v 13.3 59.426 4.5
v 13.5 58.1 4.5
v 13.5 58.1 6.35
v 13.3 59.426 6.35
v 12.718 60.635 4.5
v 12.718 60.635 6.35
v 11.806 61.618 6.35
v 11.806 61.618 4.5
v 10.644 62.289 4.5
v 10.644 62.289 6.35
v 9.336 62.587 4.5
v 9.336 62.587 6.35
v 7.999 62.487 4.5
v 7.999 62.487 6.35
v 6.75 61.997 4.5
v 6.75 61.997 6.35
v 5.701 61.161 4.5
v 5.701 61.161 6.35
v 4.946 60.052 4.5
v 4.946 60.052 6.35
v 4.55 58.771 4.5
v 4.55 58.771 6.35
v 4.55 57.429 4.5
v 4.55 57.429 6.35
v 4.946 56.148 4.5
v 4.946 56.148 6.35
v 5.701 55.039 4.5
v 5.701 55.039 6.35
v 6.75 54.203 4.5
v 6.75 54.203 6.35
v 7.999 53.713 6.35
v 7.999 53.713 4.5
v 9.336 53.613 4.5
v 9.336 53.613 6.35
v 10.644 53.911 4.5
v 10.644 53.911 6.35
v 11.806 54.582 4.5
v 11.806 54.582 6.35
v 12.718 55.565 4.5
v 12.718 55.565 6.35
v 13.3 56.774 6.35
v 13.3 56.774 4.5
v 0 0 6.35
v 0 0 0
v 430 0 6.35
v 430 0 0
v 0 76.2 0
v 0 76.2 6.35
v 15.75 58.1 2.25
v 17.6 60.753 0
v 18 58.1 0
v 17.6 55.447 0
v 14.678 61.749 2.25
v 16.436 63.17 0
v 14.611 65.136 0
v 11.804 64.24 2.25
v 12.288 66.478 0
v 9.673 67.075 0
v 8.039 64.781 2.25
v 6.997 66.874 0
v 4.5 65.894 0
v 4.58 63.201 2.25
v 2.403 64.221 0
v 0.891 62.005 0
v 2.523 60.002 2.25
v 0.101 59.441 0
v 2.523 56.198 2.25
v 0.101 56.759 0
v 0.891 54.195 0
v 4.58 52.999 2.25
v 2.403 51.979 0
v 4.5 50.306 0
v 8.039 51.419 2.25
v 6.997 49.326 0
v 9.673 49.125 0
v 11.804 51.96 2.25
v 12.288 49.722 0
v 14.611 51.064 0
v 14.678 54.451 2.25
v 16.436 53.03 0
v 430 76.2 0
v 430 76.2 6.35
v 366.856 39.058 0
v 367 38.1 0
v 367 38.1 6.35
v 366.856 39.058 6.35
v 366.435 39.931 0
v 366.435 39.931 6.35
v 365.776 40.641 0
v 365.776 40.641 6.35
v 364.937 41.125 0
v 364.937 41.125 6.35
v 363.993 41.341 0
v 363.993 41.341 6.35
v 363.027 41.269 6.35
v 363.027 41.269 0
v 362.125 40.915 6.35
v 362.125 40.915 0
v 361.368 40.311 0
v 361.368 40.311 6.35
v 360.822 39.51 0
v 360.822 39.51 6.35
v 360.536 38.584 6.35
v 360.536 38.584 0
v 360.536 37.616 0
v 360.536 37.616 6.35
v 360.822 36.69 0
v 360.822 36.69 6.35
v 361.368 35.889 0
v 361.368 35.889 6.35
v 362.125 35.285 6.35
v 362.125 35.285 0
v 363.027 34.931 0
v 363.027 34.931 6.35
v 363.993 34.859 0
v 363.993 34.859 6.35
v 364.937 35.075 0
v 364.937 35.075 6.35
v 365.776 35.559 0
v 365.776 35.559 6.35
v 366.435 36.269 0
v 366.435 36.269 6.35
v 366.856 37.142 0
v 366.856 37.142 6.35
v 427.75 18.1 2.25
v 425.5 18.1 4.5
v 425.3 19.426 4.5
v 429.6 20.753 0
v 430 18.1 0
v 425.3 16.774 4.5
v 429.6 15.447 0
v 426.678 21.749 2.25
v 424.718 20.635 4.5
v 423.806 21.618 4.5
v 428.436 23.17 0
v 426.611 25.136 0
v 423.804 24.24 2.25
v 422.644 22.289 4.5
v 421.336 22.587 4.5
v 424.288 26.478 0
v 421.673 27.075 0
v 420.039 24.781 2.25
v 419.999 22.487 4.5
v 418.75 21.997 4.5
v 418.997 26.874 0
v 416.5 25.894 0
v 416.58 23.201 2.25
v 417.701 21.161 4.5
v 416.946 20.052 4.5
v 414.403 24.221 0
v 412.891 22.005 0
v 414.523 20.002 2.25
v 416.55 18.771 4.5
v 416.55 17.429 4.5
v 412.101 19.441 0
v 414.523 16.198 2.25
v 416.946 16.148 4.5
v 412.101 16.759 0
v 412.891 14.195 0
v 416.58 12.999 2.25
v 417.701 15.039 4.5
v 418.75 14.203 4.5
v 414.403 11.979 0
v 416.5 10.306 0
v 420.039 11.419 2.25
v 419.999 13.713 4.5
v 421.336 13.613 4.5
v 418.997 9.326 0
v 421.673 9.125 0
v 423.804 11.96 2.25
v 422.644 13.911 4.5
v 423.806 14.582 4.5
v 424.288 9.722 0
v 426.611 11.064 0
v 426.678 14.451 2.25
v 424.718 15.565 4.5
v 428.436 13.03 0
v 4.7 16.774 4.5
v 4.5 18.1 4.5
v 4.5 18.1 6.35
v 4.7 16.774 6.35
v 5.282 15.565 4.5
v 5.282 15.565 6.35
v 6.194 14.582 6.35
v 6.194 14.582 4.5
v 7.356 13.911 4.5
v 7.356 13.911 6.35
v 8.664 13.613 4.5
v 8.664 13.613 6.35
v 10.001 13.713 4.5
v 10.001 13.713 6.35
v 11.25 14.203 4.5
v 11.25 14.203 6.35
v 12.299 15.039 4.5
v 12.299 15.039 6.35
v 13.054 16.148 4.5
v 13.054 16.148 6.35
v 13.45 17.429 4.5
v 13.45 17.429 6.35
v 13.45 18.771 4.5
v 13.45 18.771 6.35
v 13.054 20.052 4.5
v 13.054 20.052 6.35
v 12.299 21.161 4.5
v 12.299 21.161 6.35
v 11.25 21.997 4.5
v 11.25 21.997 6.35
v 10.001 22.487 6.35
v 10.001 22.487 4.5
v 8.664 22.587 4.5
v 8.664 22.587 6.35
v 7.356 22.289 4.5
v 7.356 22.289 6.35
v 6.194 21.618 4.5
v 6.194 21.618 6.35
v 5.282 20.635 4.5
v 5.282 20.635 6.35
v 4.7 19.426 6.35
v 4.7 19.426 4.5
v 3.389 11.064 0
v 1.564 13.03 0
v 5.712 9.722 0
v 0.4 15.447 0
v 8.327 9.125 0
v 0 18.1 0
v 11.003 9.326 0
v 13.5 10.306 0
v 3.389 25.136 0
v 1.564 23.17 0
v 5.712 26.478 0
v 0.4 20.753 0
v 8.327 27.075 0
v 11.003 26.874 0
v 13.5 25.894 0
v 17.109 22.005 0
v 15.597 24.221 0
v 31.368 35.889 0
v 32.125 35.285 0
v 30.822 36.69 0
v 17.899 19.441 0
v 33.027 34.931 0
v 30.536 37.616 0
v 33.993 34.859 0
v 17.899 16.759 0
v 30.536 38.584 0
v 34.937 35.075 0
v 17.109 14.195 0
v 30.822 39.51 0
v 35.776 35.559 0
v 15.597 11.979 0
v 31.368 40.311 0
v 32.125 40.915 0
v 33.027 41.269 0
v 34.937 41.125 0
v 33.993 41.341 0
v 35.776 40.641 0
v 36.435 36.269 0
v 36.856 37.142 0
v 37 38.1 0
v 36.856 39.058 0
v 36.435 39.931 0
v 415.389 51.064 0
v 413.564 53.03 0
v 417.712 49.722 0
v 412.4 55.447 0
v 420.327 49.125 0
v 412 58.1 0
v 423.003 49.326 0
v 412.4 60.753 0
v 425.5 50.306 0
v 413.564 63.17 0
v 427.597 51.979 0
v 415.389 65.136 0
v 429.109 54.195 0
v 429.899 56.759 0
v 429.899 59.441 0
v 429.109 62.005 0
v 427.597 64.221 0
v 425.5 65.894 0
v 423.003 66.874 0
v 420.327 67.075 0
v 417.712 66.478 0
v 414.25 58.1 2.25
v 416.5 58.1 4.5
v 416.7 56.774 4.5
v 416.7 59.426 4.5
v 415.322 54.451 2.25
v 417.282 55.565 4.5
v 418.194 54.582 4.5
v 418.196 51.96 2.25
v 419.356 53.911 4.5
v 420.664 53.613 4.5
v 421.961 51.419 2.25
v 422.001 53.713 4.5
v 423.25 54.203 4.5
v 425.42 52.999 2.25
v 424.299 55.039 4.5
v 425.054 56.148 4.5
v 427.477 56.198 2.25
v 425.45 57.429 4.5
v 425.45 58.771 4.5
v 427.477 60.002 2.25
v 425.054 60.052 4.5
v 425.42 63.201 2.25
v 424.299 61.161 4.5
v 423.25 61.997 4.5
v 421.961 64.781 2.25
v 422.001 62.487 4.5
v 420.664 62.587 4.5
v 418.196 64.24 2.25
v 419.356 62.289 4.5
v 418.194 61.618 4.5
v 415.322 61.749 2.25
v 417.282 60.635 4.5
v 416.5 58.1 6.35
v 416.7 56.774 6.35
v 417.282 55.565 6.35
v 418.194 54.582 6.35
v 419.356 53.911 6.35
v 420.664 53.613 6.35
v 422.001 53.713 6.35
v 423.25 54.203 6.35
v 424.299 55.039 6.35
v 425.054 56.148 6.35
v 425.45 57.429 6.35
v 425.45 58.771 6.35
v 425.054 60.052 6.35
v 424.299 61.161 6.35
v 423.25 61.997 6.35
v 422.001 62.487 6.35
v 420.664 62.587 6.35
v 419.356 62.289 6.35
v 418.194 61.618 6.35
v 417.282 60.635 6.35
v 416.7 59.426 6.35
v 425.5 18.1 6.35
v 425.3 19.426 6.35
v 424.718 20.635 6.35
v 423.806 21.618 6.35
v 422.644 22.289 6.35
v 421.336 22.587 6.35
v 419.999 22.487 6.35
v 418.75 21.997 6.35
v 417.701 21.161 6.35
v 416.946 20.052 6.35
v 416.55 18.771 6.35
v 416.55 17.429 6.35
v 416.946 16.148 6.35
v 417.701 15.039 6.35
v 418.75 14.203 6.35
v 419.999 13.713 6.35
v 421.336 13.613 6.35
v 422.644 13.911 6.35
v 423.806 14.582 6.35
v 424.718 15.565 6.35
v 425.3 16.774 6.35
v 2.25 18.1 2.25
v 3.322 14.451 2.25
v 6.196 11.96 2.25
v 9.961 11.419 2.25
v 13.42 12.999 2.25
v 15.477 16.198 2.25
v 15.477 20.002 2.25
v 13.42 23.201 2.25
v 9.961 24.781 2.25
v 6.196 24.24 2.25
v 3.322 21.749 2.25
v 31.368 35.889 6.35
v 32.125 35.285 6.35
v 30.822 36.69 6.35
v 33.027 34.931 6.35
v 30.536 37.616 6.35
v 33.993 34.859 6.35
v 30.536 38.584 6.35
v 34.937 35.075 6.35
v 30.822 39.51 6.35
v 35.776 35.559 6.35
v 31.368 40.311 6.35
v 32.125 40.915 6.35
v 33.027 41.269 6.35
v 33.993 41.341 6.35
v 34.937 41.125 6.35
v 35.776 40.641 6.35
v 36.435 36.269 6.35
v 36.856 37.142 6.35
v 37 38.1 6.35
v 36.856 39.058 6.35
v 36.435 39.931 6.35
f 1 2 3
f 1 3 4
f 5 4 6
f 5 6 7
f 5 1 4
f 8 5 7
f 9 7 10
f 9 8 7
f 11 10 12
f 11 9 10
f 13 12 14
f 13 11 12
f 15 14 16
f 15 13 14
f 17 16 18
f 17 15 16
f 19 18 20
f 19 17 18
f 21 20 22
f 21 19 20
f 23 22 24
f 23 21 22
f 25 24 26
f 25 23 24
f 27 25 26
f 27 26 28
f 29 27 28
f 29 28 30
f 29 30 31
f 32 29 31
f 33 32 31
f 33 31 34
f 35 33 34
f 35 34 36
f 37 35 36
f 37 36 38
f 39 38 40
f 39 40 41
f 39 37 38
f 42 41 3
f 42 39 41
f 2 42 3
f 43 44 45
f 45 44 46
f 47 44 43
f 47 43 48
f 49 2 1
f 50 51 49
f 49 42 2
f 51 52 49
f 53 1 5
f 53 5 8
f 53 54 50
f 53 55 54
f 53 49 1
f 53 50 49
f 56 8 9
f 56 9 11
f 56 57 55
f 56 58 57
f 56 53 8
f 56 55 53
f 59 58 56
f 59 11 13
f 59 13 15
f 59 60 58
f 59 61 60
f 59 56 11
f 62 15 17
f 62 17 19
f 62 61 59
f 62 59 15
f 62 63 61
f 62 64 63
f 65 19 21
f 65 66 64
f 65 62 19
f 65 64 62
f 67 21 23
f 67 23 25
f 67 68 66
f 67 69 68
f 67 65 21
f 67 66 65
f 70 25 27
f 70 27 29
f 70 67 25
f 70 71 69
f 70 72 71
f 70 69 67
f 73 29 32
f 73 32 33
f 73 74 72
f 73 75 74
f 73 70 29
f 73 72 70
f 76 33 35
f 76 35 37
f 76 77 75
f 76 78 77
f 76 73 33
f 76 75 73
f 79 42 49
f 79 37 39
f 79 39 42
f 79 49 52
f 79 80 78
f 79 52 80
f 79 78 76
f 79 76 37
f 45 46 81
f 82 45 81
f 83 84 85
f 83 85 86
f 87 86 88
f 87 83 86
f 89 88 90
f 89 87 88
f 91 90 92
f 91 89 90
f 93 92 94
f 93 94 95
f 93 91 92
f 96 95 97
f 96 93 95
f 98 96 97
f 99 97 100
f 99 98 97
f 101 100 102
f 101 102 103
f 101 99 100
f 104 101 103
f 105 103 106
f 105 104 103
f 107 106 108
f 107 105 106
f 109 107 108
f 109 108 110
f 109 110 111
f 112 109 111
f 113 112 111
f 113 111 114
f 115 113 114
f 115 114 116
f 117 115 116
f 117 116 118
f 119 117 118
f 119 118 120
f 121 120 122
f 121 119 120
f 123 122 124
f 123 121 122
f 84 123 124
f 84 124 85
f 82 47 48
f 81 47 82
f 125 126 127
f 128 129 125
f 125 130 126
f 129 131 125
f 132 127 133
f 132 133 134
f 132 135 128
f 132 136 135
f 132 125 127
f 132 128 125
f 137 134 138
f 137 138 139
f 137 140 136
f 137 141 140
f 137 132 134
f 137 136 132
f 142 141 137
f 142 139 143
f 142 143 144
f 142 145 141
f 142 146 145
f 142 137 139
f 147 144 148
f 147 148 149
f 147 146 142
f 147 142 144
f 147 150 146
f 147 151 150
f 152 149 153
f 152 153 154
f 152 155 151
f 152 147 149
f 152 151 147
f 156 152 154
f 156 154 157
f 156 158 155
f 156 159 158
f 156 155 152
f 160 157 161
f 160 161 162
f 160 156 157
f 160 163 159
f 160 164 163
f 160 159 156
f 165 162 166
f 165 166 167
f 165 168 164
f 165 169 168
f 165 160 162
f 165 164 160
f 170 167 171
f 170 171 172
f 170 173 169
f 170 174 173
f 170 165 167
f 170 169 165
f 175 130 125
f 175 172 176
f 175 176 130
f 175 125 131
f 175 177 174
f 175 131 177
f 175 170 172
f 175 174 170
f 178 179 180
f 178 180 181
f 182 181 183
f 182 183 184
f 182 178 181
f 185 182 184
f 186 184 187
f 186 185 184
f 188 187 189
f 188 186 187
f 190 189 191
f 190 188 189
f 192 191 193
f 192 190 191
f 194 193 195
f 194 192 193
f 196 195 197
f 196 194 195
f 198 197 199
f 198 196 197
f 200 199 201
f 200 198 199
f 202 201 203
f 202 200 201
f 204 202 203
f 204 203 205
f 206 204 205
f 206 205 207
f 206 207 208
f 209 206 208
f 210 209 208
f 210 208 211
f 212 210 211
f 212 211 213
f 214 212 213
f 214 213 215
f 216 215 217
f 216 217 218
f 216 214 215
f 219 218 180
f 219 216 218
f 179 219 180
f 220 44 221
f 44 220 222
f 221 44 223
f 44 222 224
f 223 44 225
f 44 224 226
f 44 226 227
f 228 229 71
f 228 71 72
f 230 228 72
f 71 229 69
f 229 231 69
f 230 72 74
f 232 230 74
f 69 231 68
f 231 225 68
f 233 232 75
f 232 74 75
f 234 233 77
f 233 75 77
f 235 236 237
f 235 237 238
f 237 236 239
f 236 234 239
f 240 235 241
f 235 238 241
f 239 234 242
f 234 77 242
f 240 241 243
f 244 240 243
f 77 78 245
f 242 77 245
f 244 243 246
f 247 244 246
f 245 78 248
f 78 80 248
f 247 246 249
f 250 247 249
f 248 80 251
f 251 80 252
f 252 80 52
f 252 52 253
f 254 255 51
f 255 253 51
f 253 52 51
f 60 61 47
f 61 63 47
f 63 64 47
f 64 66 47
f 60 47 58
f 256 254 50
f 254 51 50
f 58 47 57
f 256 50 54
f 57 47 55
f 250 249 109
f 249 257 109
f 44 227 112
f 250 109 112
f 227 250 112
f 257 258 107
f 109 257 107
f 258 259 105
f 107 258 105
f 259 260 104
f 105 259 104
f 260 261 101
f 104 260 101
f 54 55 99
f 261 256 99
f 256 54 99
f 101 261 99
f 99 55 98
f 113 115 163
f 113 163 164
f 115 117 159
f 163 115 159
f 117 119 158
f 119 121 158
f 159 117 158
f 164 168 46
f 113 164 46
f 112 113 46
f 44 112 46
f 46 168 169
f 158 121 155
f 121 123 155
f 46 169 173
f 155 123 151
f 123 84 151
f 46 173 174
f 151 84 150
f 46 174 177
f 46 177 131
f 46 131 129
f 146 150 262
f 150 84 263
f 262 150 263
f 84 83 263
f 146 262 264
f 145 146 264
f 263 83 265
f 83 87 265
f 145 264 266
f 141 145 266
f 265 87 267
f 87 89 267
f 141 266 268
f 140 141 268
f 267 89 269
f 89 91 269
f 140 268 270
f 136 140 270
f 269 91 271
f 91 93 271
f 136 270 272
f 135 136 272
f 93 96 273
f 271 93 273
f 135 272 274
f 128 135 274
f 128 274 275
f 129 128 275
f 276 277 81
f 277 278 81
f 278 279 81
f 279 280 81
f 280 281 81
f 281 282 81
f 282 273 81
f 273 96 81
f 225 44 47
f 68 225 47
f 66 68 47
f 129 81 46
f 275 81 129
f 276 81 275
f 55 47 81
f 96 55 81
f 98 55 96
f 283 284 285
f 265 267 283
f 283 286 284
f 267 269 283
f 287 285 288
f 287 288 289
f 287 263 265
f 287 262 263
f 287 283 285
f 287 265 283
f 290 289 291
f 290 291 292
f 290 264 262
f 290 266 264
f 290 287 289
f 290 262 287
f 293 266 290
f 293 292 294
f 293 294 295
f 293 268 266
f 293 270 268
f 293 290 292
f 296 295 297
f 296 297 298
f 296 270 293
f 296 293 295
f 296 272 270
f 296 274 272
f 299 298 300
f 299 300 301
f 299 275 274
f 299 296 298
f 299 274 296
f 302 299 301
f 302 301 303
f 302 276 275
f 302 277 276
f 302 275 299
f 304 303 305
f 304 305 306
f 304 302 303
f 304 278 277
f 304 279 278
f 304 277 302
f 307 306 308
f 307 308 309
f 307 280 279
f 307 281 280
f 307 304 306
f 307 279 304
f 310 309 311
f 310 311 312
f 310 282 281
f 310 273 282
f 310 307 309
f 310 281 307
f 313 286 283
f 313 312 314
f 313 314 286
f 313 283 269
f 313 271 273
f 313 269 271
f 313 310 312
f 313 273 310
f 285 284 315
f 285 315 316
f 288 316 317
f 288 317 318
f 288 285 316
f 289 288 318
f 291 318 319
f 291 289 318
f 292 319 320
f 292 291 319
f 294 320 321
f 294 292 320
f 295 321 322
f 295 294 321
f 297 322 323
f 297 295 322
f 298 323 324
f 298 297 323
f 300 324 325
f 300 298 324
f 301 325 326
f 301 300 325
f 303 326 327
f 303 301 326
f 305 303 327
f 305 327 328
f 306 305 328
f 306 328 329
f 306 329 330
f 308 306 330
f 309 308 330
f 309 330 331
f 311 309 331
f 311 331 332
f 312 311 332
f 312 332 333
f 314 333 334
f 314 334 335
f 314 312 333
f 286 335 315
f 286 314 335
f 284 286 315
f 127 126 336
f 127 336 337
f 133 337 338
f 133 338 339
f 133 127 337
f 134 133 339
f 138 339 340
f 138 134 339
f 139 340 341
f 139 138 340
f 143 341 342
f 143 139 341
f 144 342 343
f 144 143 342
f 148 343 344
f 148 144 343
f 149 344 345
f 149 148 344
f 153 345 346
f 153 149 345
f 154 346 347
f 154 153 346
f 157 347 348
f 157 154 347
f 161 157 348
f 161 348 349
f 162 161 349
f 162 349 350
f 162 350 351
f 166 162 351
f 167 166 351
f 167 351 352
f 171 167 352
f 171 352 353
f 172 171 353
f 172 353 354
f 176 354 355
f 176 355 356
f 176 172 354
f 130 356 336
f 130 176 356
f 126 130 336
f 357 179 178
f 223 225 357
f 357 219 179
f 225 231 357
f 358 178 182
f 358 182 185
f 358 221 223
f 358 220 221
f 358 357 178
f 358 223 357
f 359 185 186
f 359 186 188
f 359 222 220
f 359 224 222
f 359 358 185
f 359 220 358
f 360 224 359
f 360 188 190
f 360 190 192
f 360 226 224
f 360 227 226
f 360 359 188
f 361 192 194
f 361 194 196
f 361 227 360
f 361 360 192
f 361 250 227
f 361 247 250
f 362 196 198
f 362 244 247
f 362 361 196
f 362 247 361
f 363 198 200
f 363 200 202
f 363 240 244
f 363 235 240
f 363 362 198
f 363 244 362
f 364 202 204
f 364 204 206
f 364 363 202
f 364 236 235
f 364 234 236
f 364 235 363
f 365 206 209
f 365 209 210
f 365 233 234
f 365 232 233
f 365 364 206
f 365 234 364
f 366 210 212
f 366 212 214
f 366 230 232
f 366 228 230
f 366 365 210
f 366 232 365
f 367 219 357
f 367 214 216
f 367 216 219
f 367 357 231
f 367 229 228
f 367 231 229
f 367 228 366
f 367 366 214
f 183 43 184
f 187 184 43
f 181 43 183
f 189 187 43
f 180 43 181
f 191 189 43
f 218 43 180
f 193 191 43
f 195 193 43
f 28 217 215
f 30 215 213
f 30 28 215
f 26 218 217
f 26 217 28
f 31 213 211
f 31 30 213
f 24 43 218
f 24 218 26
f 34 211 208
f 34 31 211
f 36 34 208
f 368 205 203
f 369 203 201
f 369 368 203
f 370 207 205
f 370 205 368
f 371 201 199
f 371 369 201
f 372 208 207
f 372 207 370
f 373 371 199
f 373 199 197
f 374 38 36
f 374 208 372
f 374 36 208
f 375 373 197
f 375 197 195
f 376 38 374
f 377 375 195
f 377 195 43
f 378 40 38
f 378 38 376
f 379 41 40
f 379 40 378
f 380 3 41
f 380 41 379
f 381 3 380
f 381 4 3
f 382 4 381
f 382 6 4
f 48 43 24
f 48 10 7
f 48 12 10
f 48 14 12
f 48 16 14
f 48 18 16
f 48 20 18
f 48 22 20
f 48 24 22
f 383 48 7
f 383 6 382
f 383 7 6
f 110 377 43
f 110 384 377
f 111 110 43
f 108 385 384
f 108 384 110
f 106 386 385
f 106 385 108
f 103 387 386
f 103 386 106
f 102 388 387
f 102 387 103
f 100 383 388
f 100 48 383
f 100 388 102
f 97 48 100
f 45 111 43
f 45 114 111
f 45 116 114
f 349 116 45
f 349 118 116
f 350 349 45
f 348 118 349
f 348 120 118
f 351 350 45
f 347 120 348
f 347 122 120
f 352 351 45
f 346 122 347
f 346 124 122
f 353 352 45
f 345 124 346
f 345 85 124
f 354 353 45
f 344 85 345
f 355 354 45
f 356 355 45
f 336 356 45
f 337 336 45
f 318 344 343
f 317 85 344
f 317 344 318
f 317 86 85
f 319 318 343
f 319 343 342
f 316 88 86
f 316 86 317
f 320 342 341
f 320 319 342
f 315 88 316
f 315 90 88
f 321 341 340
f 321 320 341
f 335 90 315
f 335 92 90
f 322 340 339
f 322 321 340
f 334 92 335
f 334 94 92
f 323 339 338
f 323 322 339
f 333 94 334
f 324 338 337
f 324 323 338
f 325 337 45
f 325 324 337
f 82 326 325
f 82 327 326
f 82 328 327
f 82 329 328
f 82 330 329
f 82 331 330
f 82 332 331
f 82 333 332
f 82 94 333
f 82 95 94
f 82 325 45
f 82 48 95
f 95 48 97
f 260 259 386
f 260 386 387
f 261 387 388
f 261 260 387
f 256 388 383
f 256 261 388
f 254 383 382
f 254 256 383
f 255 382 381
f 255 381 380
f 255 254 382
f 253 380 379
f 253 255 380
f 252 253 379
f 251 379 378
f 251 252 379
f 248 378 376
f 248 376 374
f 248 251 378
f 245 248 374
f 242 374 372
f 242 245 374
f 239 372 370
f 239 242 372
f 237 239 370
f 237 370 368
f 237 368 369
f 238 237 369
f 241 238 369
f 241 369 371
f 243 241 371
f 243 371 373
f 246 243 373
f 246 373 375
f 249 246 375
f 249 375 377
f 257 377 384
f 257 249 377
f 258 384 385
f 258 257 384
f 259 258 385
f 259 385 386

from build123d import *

# Parameters (mm, degrees)
SKETCH1_W           = 430
SKETCH1_H           = 76.2
SKETCH1_R           = 4.5
SKETCH1_R_2         = 3.25
BOSS_EXTRUDE1_DEPTH = 6.35
CHAMFER1_SIZE       = 4.5


with BuildPart() as part:
    # Sketch1 → Boss-Extrude1 (new body)
    with BuildSketch(Plane.XY):
        with Locations((215, 38.1)):
            Rectangle(SKETCH1_W, SKETCH1_H)
        with Locations((9, 58.1)):
            Circle(SKETCH1_R, mode=Mode.SUBTRACT)
        with Locations(Location((9, 18.1, 0), (0, 0, 180))):
            Circle(SKETCH1_R, mode=Mode.SUBTRACT)
        with Locations((421, 18.1)):
            Circle(SKETCH1_R, mode=Mode.SUBTRACT)
        with Locations(Location((421, 58.1, 0), (0, 0, 180))):
            Circle(SKETCH1_R, mode=Mode.SUBTRACT)
        with Locations((33.75, 38.1)):
            Circle(SKETCH1_R_2, mode=Mode.SUBTRACT)
        with Locations((363.75, 38.1)):
            Circle(SKETCH1_R_2, mode=Mode.SUBTRACT)
    extrude(amount=BOSS_EXTRUDE1_DEPTH)

    # Chamfer1
    chamfer1_edges = [part.edges().sort_by_distance(p)[0] for p in [
        (4.5, 58.1, 0),
        (13.5, 18.1, 0),
        (416.5, 18.1, 0),
        (425.5, 58.1, 0),
    ]]
    chamfer(chamfer1_edges, length=CHAMFER1_SIZE - 0.0001)  # a hair under: the kernel refuses the full size


solid = part.part
